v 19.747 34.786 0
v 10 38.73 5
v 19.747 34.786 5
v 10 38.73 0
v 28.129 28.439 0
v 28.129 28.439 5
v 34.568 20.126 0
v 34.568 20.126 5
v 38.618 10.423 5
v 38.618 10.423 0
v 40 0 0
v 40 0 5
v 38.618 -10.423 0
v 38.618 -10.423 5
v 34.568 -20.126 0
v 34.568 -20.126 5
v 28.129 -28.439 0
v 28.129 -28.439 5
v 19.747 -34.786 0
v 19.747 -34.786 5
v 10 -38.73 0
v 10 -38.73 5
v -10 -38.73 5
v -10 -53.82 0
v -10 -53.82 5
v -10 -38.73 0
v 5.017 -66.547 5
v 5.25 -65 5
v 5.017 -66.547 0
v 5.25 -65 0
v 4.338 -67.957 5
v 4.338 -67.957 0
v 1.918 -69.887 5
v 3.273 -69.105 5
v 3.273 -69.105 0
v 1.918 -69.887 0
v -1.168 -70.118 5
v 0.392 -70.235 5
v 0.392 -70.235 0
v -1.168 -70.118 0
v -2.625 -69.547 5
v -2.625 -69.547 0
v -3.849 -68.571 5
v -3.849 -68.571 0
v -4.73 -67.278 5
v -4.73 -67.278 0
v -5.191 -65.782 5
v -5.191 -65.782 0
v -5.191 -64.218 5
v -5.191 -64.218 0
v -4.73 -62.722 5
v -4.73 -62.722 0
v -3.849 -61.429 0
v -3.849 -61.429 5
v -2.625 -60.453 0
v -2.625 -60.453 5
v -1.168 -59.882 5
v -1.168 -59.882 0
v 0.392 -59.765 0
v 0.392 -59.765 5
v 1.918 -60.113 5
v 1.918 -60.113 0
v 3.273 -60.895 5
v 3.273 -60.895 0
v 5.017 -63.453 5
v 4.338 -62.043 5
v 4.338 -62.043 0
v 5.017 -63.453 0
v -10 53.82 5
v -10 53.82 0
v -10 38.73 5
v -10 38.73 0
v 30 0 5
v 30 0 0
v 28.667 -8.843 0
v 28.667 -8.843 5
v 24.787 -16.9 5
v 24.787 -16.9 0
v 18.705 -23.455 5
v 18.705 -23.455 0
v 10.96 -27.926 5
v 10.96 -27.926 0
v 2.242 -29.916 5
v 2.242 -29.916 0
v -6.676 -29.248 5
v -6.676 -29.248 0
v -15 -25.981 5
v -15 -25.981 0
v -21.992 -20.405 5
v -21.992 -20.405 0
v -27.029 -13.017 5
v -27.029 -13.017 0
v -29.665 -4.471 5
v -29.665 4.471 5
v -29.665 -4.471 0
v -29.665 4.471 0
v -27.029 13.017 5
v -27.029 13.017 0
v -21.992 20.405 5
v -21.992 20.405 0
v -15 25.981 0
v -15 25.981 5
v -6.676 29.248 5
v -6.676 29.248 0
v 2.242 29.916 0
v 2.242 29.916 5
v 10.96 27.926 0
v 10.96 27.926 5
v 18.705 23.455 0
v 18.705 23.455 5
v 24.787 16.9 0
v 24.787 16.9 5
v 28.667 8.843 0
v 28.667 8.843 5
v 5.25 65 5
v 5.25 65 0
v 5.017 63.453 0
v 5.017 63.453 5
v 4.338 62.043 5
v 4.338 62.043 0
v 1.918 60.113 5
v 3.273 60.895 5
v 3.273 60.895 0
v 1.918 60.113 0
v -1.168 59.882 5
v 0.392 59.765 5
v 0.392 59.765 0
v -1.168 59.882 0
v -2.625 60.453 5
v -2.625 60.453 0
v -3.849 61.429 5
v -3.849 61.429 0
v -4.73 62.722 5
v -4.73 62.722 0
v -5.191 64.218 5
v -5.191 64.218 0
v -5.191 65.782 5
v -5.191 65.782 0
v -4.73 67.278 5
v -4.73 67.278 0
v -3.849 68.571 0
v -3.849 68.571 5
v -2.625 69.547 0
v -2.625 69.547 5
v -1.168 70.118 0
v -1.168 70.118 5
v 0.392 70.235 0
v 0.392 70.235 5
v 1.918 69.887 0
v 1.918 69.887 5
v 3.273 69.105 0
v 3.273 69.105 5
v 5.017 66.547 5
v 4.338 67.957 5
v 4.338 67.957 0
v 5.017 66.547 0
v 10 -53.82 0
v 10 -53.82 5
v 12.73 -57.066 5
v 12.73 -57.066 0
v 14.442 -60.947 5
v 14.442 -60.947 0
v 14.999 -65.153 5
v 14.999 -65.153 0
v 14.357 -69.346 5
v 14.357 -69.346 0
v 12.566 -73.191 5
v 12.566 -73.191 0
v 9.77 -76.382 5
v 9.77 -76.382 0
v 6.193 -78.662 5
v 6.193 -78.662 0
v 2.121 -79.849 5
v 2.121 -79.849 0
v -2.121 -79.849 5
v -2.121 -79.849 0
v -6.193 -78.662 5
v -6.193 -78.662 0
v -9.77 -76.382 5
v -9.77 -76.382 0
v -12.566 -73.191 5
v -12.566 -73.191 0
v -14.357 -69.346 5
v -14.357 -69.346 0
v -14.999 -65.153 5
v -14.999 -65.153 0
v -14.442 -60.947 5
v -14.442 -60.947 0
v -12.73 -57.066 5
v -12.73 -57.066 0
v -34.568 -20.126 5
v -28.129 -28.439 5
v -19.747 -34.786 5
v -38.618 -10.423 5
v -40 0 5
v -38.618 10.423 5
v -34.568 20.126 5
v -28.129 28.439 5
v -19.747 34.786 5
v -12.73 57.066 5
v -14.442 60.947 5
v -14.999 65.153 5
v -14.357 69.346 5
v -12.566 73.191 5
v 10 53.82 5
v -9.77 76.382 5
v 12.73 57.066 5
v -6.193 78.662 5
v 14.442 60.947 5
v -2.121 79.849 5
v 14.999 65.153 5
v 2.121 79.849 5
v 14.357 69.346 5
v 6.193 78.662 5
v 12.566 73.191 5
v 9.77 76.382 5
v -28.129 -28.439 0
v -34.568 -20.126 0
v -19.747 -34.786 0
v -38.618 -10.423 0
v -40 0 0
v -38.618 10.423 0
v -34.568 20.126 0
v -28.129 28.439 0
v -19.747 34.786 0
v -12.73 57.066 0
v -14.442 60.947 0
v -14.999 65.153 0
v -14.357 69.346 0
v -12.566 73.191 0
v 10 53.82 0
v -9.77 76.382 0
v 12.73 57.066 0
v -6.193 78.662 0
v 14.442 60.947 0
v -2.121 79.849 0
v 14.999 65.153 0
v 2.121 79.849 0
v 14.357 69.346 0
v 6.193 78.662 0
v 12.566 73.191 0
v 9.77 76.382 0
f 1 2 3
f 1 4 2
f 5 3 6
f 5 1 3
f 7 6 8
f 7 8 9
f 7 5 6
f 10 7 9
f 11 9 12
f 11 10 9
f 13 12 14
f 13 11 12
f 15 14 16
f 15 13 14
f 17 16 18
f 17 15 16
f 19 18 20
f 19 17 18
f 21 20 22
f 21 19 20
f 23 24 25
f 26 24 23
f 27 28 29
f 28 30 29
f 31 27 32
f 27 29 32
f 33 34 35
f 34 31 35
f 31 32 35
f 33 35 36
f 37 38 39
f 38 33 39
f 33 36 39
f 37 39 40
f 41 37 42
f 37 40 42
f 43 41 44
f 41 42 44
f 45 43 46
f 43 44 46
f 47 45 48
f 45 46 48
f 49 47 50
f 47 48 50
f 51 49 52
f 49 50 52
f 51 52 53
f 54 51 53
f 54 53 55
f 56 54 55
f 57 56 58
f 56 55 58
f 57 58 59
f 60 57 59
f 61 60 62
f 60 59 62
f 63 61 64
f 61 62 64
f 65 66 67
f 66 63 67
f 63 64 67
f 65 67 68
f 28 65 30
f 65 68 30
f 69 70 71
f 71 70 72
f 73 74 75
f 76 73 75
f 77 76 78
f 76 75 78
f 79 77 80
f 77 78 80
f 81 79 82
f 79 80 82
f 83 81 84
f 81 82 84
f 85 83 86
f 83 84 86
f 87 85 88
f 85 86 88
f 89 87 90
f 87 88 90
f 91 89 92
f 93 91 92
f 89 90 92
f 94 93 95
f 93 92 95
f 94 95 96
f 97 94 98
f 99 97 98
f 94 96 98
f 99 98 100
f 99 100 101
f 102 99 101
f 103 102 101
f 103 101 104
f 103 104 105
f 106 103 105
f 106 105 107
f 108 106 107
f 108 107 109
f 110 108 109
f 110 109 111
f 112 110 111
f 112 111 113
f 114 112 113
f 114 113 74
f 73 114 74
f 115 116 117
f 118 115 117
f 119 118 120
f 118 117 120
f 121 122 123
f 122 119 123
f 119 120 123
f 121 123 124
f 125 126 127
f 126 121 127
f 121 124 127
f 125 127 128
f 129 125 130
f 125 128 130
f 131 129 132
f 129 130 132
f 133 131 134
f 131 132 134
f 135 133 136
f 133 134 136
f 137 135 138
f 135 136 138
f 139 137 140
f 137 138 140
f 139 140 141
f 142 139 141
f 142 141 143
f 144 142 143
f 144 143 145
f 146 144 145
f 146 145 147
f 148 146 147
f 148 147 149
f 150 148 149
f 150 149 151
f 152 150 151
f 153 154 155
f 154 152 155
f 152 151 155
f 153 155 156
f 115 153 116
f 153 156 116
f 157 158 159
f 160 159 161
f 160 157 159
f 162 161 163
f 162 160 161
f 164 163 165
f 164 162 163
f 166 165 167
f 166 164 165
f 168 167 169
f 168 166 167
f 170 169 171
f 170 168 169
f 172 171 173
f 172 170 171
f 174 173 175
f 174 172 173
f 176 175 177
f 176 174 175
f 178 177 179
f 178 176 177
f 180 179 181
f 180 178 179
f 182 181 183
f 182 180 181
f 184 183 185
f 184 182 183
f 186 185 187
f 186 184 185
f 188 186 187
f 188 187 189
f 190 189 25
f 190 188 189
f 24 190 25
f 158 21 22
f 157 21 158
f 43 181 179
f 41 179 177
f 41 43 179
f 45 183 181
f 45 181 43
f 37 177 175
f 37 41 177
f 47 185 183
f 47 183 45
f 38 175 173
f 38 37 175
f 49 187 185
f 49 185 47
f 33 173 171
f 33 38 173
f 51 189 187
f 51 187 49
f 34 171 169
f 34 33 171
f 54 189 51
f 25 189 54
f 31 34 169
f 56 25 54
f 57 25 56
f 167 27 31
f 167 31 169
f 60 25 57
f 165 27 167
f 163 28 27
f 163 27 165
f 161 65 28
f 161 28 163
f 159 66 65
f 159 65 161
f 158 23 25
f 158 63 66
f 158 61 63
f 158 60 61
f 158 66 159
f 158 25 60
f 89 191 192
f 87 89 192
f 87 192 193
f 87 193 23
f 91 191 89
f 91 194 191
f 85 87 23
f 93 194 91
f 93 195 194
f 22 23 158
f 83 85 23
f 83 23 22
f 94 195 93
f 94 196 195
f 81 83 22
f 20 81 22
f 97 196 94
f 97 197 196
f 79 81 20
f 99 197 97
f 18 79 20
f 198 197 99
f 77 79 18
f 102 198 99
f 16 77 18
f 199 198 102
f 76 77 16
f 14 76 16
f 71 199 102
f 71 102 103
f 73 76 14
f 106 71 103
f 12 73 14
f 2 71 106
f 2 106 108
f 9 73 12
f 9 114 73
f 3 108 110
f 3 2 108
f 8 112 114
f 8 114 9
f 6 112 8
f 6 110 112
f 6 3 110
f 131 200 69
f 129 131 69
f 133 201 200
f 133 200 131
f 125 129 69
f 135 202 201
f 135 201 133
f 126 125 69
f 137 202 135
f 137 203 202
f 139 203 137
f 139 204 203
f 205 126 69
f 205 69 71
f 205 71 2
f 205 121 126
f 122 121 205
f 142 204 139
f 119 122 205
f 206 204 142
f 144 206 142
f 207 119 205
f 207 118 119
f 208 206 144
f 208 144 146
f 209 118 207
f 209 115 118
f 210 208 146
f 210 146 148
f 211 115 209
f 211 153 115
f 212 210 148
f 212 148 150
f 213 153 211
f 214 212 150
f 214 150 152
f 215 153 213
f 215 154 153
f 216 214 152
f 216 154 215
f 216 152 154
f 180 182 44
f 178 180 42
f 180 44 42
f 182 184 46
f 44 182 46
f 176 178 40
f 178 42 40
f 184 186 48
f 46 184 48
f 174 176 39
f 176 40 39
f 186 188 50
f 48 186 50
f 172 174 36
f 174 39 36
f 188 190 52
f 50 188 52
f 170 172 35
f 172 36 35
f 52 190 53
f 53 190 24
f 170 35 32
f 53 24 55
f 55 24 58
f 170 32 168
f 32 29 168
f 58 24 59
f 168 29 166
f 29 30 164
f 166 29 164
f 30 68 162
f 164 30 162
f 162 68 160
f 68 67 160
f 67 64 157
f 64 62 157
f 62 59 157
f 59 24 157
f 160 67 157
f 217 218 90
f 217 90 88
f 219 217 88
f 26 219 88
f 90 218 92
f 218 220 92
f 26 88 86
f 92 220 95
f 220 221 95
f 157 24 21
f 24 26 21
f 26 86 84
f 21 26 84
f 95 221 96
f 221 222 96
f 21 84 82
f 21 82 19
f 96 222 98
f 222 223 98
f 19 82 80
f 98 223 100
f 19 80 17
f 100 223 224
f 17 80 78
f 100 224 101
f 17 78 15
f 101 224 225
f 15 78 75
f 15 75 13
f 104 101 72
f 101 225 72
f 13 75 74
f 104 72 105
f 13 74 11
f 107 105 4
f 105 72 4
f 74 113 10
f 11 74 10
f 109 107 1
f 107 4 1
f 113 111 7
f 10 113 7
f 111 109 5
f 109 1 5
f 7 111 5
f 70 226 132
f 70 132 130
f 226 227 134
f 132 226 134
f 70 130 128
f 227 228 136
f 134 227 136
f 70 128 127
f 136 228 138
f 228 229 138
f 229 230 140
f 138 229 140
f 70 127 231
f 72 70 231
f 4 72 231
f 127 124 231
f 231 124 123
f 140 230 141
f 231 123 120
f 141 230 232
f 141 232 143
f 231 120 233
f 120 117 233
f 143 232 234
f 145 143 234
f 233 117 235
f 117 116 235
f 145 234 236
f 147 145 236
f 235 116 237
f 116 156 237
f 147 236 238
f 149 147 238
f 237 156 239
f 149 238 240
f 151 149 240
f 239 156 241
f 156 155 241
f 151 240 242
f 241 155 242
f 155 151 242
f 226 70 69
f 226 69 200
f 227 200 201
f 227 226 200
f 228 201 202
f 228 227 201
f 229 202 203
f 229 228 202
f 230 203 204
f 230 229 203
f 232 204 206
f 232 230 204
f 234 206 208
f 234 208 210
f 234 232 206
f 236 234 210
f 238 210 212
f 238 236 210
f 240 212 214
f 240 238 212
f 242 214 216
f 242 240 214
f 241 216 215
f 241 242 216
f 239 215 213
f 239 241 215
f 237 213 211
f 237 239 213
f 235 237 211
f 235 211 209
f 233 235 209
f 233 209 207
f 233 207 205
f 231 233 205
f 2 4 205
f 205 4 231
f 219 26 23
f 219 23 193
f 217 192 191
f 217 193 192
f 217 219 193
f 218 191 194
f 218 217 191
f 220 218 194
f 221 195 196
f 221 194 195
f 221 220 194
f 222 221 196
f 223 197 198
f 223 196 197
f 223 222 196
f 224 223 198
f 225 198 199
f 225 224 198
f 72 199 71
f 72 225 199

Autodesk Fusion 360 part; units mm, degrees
sketch "Sketch1" plane through (0, 0, 0) normal (0, 0, 1) x (1, 0, 0)
  circle A0 centre (0, 0) radius 90
  circle A1 centre (0, 65) radius 10
  circle A2 centre (0, -65) radius 10
  circle A3 centre (0, 0) radius 25
  circle A4 centre (0, 0) radius 35
  circle A5 centre (0, 65) radius 20
  circle A6 centre (0, -65) radius 20
  line L0 (-10, 30) -> (10, 30)
  line L1 (10, 30) -> (10, 50)
  line L2 (10, 50) -> (-10, 50)
  line L3 (-10, 50) -> (-10, 30)
  line L4 (-10, -30) -> (10, -30)
  line L5 (10, -30) -> (10, -50)
  line L6 (10, -50) -> (-10, -50)
  line L7 (-10, -50) -> (-10, -30)
  dimension "d1" = 50
extrude "Extrude1" add sketch "Sketch1" along normal blind 5 contours A4 L0 L1 L3 L4 L5 L7 | A4 L0 L1 L3 | A4 A5 L1 L3 | A4 A6 L5 L7 | A4 L4 L5 L7 | A5 L1 L2 L3 | A5 L1 L2 L3 | A6 L5 L6 L7 | A6 L5 L6 L7 makes body 1
sketch "Sketch2" plane through (0, 0, 0) normal (0, 0, 1) x (1, 0, 0)
sketch "Sketch3" plane through (0, 0, 0) normal (0, 0, 1) x (1, 0, 0)
  circle A0 centre (0, 0) radius 30
extrude "Extrude2" cut sketch "Sketch3" along normal blind 8 bodies 1
sketch "Sketch4" plane through (0, 0, 0) normal (0, 0, 1) x (1, 0, 0)
sketch "Sketch5" plane through (0, 0, 0) normal (0, 1, 0) x (1, 0, 0)
sketch "Sketch6" plane through (0, 0, 0) normal (0, 0, 1) x (1, 0, 0)
  circle A0 centre (0, 65) radius 5.25
  circle A1 centre (0, 65) radius 10
  dimension "d6" = 10.5
extrude "Extrude3" add sketch "Sketch6" along normal blind 5 bodies 1
sketch "Sketch7" plane through (0, 0, 0) normal (0, 0, 1) x (1, 0, 0)
  circle A0 centre (0, -65) radius 5.25
  circle A1 centre (0, -65) radius 10
  dimension "d9" = 10.5
extrude "Extrude4" add sketch "Sketch7" along normal blind 5 bodies 1
sketch "Sketch8" plane through (0, 0, 0) normal (0, 0, 1) x (1, 0, 0)
  circle A0 centre (0, 0) radius 40
  circle A1 centre (0, 0) radius 30
  circle A2 centre (0, 0) radius 30
extrude "Extrude5" add sketch "Sketch8" along normal blind 5 bodies 1
sketch "Sketch9" plane through (0, 0, 0) normal (0, 0, 1) x (1, 0, 0)
sketch "Sketch10" plane through (0, 0, 0) normal (0, 0, 1) x (1, 0, 0)
sketch "Sketch11" plane through (0, 0, 0) normal (0, 0, 1) x (1, 0, 0)
sketch "Sketch12" plane through (0, 0, 0) normal (0, 0, 1) x (1, 0, 0)
  circle A0 centre (0, 65) radius 15
  circle A1 centre (0, 65) radius 20
extrude "Extrude6" cut sketch "Sketch12" along normal blind 30 bodies 1 makes body 2 at (11.6746, 63.994, 0)
sketch "Sketch13" plane through (0, 0, 0) normal (0, 0, 1) x (1, 0, 0)
  circle A0 centre (0, -65) radius 15
  circle A1 centre (0, -65) radius 20
extrude "Extrude7" cut sketch "Sketch13" along normal blind 22 bodies 1 makes body 3 at (3.3287, -53.7649, 0)
sketch "Sketch14" plane through (0, 0, 0) normal (0, 0, 1) x (1, 0, 0)
  line L0 (-10, -35) -> (10, -35)
  line L1 (10, -35) -> (10, -59)
  line L2 (10, -59) -> (-10, -59)
  line L3 (-10, -59) -> (-10, -35)
  line L4 (-10, 35) -> (10, 35)
  line L5 (10, 35) -> (10, 58)
  line L6 (10, 58) -> (-10, 58)
  line L7 (-10, 58) -> (-10, 35)
extrude "Extrude8" add sketch "Sketch14" along normal blind 5 bodies 1 2 3
